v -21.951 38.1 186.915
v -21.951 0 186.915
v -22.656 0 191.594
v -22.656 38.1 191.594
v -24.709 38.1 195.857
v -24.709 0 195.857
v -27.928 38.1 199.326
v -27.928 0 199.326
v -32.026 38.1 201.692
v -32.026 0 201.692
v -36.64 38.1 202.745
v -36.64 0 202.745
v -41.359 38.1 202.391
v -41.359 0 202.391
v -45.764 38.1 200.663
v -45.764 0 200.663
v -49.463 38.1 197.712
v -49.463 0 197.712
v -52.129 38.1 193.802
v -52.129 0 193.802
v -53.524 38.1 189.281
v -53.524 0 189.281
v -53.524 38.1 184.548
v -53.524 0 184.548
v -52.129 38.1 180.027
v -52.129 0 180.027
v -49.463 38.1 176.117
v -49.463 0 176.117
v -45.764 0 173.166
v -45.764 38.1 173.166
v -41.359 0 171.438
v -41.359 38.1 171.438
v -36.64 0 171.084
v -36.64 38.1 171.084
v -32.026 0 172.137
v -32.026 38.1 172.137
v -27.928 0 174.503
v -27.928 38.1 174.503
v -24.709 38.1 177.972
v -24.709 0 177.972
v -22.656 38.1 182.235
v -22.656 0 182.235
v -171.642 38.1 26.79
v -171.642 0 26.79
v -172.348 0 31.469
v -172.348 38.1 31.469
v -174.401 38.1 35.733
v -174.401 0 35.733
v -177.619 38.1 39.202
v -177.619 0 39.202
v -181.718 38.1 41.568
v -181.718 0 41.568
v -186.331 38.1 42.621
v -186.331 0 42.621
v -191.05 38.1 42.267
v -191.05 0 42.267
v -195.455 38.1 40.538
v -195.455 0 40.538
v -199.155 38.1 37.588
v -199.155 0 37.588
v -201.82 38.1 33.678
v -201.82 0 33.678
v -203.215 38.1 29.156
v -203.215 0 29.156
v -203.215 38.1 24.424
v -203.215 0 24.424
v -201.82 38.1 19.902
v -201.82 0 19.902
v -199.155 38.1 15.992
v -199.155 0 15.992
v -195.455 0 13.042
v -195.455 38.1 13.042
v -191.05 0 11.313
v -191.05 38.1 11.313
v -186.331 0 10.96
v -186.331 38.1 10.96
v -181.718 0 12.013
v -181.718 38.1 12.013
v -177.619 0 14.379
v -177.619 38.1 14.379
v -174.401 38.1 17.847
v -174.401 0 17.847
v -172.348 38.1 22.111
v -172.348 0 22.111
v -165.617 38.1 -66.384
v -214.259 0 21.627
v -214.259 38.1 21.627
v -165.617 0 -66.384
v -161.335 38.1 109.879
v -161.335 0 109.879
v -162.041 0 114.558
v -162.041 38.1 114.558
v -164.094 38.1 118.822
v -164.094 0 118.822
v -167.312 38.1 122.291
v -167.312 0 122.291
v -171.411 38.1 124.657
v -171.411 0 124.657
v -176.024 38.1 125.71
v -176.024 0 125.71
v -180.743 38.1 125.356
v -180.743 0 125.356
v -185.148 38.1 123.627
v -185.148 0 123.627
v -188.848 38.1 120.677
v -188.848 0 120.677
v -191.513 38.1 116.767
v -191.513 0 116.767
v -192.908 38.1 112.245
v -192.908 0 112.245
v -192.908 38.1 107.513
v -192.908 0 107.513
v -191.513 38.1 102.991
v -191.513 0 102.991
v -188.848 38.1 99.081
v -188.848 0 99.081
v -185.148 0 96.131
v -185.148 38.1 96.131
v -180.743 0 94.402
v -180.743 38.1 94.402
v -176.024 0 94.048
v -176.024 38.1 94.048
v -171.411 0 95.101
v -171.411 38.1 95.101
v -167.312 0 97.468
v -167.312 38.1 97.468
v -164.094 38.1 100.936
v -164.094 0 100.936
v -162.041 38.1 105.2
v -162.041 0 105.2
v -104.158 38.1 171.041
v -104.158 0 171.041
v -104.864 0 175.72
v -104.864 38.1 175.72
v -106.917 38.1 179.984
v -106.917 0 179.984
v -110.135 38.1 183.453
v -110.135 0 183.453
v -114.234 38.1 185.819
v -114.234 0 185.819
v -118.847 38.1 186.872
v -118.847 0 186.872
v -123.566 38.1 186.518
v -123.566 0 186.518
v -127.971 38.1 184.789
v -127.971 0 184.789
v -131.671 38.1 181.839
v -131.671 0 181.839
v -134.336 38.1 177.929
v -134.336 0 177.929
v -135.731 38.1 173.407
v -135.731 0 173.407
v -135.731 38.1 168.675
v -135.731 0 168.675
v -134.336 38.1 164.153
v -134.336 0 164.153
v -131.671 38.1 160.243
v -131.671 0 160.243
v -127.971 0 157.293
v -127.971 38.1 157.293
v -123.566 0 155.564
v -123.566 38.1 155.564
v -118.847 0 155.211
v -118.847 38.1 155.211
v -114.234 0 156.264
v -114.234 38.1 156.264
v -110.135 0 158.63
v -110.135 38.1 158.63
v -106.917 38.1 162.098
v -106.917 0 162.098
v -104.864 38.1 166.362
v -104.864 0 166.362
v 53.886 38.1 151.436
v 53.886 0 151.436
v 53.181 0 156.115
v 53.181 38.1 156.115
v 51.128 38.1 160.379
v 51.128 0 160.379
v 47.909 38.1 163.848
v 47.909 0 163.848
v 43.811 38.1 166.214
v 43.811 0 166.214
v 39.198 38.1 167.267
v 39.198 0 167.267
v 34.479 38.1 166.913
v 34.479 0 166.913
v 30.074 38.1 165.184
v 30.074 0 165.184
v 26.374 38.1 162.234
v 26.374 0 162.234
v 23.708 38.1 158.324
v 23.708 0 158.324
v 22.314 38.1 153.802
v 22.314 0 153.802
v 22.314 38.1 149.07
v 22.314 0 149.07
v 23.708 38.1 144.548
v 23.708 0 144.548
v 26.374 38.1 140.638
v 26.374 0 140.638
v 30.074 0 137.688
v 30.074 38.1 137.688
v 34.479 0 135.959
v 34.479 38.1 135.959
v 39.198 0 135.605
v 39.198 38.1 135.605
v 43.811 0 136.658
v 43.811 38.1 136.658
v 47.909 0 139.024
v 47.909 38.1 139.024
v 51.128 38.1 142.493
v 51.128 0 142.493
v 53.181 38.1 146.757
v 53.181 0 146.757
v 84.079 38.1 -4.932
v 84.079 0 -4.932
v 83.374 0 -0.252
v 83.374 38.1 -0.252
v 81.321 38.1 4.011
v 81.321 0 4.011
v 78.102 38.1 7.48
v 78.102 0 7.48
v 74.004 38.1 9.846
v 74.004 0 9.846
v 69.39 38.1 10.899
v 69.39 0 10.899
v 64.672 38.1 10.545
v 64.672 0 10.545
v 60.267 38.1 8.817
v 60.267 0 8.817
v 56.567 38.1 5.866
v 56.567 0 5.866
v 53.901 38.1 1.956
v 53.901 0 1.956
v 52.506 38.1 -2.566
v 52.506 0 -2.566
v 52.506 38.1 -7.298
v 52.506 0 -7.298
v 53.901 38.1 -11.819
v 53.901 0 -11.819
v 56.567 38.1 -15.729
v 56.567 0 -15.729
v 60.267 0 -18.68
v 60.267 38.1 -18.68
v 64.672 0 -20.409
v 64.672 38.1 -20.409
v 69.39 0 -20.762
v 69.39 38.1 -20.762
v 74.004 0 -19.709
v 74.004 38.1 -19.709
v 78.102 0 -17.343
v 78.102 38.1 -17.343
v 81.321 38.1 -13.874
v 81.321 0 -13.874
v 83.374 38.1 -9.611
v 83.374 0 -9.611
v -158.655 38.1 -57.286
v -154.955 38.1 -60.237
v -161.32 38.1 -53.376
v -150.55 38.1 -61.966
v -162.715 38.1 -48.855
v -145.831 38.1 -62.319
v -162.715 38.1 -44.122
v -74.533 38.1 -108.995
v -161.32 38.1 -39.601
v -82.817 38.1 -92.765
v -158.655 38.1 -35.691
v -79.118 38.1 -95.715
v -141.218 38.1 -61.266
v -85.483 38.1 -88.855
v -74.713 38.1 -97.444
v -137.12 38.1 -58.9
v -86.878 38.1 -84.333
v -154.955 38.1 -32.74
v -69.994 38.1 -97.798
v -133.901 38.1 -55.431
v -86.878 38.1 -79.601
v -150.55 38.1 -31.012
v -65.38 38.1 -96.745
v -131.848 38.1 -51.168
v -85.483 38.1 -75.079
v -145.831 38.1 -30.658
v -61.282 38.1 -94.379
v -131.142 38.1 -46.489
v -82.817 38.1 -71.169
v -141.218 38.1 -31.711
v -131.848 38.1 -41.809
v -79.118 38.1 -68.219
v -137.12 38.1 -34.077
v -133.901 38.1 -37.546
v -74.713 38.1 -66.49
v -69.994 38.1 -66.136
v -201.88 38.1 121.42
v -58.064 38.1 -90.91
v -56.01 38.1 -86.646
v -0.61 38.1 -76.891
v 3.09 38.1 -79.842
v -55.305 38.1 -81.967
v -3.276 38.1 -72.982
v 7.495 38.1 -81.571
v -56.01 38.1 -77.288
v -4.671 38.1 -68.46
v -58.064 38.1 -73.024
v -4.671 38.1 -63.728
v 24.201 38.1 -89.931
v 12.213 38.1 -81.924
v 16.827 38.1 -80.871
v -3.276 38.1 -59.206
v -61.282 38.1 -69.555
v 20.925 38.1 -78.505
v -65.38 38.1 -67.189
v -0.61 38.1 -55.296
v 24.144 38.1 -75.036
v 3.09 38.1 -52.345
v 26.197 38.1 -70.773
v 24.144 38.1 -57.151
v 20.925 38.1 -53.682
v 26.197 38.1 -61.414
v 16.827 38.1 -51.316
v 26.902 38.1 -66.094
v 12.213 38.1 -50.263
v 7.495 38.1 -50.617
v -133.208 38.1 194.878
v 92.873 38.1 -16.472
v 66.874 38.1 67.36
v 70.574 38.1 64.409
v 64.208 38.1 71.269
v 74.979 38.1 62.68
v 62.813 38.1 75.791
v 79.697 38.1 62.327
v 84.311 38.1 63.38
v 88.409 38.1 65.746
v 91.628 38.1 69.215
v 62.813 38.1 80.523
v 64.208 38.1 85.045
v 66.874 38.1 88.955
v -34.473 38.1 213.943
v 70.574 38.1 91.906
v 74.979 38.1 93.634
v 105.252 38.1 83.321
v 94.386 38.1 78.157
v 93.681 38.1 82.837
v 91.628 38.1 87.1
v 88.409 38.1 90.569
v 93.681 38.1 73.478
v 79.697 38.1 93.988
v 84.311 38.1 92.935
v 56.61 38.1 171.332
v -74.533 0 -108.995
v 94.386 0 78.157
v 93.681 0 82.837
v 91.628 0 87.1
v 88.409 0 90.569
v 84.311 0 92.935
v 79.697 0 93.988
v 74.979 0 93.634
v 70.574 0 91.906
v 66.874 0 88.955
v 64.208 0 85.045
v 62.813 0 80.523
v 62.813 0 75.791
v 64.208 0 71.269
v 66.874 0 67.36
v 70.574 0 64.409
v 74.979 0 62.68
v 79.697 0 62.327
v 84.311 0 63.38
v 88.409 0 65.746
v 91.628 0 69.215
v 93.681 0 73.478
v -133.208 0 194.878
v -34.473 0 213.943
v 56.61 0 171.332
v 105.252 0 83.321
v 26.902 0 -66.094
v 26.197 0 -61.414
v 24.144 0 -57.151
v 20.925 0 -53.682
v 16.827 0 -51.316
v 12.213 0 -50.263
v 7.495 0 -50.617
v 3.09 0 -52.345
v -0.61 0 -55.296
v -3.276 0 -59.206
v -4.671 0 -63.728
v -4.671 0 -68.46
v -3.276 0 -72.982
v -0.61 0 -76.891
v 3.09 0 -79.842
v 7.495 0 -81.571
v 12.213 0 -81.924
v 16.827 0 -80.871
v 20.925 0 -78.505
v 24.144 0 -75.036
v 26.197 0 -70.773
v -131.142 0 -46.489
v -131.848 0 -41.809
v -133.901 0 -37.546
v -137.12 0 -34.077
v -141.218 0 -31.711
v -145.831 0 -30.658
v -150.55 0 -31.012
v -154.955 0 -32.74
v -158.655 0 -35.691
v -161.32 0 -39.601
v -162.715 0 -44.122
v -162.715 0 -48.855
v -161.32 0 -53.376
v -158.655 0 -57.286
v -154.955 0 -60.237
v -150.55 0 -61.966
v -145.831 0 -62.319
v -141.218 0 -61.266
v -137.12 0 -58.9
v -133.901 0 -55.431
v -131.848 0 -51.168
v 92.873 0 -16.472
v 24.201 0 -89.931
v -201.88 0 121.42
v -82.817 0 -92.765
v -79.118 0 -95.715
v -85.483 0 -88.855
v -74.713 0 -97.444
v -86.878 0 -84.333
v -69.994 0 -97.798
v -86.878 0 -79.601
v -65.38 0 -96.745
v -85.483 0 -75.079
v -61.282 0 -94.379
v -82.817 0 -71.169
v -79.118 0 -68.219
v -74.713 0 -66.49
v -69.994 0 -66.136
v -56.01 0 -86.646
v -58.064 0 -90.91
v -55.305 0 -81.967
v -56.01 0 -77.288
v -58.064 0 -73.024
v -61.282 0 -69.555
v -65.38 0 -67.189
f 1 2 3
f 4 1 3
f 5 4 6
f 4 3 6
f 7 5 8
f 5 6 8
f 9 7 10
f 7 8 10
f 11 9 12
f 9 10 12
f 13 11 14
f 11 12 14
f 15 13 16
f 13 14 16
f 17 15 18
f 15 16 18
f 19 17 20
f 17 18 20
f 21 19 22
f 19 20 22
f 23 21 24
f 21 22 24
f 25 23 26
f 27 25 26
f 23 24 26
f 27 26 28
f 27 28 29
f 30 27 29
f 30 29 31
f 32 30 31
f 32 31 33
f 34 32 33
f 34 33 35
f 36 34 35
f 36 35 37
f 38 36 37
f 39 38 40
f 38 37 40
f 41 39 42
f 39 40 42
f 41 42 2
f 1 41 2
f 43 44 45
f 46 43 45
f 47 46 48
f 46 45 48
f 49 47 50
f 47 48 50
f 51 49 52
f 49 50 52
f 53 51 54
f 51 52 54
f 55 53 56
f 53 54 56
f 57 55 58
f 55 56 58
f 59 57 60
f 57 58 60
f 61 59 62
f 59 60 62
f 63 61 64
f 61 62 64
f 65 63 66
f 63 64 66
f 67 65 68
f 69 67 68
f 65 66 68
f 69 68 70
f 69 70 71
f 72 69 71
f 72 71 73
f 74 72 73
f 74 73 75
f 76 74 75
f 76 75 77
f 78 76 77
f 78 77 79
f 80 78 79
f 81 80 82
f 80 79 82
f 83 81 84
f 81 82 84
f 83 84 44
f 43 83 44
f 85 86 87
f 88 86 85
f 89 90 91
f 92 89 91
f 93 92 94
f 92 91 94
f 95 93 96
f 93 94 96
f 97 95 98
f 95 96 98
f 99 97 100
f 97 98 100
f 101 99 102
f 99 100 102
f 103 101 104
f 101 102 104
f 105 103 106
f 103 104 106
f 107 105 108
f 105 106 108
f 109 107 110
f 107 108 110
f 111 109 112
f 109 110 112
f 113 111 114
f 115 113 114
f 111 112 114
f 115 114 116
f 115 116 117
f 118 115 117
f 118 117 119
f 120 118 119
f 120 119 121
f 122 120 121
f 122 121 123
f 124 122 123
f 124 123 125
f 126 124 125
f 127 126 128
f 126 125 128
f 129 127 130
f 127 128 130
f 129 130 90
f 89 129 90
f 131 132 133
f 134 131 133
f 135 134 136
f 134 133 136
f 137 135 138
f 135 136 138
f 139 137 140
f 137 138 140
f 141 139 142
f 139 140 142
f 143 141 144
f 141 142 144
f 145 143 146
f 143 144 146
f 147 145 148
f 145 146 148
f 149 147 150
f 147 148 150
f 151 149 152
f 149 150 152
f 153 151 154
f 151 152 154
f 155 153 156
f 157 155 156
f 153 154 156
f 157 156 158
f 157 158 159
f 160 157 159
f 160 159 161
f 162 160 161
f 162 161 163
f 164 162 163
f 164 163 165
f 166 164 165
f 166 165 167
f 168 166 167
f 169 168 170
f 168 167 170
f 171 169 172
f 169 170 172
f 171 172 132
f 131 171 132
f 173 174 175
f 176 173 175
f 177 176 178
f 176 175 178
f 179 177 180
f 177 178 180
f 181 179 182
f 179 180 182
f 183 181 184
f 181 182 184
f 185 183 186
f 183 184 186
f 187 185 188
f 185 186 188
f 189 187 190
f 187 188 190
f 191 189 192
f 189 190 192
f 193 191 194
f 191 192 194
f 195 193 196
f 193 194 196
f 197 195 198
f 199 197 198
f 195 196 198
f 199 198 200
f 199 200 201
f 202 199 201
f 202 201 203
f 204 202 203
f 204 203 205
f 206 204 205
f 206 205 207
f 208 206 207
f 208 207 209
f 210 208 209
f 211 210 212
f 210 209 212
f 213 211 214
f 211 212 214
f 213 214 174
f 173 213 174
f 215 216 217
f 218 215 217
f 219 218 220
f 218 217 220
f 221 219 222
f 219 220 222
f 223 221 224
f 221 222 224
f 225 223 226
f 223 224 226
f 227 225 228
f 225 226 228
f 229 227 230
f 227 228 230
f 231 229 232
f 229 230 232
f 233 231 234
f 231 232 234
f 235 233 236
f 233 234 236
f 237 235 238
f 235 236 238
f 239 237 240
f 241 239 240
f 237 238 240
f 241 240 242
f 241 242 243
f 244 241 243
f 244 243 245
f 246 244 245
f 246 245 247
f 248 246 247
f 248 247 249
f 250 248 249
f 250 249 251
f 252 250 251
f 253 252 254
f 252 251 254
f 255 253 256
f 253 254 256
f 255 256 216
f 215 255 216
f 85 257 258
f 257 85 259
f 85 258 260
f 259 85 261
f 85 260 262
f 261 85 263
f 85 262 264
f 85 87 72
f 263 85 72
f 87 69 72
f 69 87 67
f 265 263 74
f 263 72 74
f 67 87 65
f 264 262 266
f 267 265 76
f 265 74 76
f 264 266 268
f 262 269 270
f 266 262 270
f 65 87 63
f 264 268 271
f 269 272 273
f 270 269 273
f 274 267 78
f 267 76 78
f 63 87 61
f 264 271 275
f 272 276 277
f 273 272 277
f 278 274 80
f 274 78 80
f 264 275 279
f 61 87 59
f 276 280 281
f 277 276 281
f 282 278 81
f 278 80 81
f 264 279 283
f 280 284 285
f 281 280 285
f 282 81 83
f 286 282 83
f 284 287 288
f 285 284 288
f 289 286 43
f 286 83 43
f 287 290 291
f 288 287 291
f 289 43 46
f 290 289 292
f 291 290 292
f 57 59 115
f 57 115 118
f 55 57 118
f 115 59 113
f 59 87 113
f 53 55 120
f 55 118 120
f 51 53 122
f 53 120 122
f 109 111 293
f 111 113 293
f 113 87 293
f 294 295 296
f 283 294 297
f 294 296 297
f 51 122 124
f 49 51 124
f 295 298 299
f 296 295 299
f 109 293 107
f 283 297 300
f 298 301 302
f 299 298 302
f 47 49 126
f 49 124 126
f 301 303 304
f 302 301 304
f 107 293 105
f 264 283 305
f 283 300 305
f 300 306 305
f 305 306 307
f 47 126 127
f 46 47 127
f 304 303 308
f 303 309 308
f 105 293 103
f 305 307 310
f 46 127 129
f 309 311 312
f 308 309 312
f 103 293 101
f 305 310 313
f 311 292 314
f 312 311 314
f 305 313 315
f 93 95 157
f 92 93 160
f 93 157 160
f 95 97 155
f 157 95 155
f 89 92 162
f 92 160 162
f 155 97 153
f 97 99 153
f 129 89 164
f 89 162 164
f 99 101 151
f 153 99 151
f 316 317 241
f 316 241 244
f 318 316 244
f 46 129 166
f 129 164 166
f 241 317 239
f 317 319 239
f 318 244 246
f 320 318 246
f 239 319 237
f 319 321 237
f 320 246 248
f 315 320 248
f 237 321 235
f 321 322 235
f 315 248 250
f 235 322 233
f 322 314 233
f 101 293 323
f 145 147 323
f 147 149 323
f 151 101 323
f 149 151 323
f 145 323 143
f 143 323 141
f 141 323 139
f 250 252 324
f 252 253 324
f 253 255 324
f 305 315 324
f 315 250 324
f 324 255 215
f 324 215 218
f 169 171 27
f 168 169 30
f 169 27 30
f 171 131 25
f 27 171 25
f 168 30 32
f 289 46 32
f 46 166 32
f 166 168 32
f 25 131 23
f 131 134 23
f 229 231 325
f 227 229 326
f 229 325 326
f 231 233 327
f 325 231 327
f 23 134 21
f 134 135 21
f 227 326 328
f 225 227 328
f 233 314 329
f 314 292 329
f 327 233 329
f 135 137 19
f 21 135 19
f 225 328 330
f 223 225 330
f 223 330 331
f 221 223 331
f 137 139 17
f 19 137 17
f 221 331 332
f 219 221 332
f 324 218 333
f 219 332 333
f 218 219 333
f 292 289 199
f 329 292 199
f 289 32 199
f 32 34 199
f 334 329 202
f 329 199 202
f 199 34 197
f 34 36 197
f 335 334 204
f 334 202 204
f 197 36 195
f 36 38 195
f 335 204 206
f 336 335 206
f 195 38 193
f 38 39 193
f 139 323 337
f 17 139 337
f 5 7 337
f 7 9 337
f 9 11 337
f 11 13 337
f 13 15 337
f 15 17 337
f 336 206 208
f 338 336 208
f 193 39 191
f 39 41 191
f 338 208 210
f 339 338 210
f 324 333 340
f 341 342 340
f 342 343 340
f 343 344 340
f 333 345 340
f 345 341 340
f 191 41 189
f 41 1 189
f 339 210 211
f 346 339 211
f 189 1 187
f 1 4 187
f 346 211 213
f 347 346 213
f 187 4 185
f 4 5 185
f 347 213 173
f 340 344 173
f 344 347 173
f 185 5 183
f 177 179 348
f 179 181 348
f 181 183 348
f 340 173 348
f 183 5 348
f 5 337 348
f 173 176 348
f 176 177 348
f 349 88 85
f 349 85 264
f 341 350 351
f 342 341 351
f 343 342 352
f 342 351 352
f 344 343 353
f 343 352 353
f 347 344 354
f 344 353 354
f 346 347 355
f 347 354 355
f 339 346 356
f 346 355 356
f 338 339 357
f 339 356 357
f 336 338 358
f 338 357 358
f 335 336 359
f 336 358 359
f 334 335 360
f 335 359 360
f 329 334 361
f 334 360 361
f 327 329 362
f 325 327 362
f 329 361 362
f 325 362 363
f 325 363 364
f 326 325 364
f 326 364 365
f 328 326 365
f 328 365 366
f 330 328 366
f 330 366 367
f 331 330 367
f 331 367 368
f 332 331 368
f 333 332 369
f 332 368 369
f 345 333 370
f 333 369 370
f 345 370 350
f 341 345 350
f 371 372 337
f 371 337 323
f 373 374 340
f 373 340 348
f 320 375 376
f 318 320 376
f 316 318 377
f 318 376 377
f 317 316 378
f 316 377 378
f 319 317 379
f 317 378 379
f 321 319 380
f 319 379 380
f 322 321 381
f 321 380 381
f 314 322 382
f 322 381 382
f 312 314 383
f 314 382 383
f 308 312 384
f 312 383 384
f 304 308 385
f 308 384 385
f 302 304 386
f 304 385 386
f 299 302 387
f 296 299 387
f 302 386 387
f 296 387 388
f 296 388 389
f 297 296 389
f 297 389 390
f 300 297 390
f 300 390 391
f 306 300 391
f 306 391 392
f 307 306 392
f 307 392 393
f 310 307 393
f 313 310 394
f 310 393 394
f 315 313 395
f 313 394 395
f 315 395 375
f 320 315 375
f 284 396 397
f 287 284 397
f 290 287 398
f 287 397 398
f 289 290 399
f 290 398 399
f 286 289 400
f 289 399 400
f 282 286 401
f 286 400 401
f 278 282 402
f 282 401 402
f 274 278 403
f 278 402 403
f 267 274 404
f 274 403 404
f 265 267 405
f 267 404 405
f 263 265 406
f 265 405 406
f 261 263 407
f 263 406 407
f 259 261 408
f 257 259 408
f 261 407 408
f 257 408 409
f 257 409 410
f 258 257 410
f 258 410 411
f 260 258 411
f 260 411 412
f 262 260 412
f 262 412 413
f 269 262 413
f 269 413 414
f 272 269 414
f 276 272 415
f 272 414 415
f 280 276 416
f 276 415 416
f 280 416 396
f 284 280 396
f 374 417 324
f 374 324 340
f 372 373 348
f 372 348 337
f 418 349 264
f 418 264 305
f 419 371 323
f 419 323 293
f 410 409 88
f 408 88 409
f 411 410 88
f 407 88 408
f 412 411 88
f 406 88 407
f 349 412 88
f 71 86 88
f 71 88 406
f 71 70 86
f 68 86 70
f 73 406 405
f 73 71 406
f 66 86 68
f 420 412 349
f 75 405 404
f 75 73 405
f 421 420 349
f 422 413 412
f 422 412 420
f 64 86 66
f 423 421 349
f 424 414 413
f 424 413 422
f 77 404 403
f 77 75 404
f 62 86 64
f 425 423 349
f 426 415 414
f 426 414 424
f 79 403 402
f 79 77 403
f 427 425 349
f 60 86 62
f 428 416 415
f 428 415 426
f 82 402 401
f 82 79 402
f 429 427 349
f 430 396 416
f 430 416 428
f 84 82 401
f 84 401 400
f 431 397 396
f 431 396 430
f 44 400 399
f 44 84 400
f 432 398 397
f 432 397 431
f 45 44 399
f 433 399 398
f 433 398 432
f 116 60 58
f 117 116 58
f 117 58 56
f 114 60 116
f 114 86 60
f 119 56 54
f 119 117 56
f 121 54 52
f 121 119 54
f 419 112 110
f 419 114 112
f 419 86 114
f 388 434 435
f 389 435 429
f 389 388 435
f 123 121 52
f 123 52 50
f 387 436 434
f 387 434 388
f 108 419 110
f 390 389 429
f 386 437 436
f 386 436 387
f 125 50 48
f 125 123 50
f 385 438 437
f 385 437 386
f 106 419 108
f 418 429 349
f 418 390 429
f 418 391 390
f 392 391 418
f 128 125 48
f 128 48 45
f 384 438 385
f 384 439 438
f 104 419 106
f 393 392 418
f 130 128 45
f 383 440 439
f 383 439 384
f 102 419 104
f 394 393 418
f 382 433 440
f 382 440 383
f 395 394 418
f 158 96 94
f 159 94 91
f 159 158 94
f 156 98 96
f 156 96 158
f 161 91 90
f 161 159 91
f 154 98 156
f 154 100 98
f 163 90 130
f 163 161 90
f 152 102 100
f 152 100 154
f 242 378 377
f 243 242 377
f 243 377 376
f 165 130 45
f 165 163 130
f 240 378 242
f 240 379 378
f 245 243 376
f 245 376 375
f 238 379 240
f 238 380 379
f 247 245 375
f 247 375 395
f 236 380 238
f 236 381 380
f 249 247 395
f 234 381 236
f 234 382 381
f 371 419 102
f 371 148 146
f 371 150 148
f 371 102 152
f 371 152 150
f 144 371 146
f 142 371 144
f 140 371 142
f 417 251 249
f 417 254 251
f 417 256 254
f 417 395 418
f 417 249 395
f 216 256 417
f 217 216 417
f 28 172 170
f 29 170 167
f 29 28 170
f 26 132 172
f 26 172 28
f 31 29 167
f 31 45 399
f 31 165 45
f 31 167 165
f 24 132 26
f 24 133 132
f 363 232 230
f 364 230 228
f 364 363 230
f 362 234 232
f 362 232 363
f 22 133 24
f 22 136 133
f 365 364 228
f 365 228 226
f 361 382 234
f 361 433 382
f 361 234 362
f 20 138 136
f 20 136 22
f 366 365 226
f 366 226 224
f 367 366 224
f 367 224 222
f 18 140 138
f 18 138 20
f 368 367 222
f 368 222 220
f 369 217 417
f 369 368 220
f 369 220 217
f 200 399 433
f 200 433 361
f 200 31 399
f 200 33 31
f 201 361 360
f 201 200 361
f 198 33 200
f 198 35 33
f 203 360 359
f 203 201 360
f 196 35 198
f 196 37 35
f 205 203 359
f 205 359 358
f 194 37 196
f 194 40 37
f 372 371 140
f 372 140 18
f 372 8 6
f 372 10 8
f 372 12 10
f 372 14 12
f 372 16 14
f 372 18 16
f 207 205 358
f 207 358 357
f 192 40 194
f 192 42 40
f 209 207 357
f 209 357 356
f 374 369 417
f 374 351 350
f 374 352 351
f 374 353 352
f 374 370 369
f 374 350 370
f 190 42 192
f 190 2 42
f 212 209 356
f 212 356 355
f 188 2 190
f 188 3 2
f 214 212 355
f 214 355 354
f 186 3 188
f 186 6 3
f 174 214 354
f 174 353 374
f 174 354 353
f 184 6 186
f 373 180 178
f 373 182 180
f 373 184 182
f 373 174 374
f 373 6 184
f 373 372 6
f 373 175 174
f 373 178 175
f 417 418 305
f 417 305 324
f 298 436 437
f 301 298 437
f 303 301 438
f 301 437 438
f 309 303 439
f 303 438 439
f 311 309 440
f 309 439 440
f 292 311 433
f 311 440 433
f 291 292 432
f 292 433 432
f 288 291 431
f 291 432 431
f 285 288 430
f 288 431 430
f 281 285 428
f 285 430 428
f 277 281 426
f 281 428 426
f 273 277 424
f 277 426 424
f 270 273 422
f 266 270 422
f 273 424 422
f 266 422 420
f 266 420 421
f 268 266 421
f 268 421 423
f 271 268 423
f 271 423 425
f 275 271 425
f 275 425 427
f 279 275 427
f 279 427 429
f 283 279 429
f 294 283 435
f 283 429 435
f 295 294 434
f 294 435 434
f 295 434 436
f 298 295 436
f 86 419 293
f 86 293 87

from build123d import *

# Parameters (mm, degrees)
F0_R     = 15.875
F1_DEPTH = 38.1


with BuildPart() as f1:
    # F0 (on Front) → F1 (new body)
    with BuildSketch(Plane.XZ):
        Polygon((24.201399, -89.930544), (92.873329, -16.472389), (105.252468, 83.320855), (56.610405, 171.33156), (-34.473246, 213.942629), (-133.207625, 194.878081), (-201.879555, 121.419927), (-214.258694, 21.626683), (-165.616631, -66.384023), (-74.532981, -108.995092), align=None)
        with Locations((-147.017439, -46.488524)):
            Circle(F0_R, mode=Mode.SUBTRACT)
        with Locations((-71.180199, -81.966965)):
            Circle(F0_R, mode=Mode.SUBTRACT)
        with Locations((-187.517351, 26.790149)):
            Circle(F0_R, mode=Mode.SUBTRACT)
        with Locations((11.027121, -66.093614)):
            Circle(F0_R, mode=Mode.SUBTRACT)
        with Locations((68.204119, -4.931554)):
            Circle(F0_R, mode=Mode.SUBTRACT)
        with Locations((-177.210345, 109.879091)):
            Circle(F0_R, mode=Mode.SUBTRACT)
        with Locations((-120.033347, 171.041152)):
            Circle(F0_R, mode=Mode.SUBTRACT)
        with Locations((78.511125, 78.157389)):
            Circle(F0_R, mode=Mode.SUBTRACT)
        with Locations((-37.826027, 186.914502)):
            Circle(F0_R, mode=Mode.SUBTRACT)
        with Locations((38.011213, 151.436061)):
            Circle(F0_R, mode=Mode.SUBTRACT)
    extrude(amount=-F1_DEPTH)


solid = f1.part
